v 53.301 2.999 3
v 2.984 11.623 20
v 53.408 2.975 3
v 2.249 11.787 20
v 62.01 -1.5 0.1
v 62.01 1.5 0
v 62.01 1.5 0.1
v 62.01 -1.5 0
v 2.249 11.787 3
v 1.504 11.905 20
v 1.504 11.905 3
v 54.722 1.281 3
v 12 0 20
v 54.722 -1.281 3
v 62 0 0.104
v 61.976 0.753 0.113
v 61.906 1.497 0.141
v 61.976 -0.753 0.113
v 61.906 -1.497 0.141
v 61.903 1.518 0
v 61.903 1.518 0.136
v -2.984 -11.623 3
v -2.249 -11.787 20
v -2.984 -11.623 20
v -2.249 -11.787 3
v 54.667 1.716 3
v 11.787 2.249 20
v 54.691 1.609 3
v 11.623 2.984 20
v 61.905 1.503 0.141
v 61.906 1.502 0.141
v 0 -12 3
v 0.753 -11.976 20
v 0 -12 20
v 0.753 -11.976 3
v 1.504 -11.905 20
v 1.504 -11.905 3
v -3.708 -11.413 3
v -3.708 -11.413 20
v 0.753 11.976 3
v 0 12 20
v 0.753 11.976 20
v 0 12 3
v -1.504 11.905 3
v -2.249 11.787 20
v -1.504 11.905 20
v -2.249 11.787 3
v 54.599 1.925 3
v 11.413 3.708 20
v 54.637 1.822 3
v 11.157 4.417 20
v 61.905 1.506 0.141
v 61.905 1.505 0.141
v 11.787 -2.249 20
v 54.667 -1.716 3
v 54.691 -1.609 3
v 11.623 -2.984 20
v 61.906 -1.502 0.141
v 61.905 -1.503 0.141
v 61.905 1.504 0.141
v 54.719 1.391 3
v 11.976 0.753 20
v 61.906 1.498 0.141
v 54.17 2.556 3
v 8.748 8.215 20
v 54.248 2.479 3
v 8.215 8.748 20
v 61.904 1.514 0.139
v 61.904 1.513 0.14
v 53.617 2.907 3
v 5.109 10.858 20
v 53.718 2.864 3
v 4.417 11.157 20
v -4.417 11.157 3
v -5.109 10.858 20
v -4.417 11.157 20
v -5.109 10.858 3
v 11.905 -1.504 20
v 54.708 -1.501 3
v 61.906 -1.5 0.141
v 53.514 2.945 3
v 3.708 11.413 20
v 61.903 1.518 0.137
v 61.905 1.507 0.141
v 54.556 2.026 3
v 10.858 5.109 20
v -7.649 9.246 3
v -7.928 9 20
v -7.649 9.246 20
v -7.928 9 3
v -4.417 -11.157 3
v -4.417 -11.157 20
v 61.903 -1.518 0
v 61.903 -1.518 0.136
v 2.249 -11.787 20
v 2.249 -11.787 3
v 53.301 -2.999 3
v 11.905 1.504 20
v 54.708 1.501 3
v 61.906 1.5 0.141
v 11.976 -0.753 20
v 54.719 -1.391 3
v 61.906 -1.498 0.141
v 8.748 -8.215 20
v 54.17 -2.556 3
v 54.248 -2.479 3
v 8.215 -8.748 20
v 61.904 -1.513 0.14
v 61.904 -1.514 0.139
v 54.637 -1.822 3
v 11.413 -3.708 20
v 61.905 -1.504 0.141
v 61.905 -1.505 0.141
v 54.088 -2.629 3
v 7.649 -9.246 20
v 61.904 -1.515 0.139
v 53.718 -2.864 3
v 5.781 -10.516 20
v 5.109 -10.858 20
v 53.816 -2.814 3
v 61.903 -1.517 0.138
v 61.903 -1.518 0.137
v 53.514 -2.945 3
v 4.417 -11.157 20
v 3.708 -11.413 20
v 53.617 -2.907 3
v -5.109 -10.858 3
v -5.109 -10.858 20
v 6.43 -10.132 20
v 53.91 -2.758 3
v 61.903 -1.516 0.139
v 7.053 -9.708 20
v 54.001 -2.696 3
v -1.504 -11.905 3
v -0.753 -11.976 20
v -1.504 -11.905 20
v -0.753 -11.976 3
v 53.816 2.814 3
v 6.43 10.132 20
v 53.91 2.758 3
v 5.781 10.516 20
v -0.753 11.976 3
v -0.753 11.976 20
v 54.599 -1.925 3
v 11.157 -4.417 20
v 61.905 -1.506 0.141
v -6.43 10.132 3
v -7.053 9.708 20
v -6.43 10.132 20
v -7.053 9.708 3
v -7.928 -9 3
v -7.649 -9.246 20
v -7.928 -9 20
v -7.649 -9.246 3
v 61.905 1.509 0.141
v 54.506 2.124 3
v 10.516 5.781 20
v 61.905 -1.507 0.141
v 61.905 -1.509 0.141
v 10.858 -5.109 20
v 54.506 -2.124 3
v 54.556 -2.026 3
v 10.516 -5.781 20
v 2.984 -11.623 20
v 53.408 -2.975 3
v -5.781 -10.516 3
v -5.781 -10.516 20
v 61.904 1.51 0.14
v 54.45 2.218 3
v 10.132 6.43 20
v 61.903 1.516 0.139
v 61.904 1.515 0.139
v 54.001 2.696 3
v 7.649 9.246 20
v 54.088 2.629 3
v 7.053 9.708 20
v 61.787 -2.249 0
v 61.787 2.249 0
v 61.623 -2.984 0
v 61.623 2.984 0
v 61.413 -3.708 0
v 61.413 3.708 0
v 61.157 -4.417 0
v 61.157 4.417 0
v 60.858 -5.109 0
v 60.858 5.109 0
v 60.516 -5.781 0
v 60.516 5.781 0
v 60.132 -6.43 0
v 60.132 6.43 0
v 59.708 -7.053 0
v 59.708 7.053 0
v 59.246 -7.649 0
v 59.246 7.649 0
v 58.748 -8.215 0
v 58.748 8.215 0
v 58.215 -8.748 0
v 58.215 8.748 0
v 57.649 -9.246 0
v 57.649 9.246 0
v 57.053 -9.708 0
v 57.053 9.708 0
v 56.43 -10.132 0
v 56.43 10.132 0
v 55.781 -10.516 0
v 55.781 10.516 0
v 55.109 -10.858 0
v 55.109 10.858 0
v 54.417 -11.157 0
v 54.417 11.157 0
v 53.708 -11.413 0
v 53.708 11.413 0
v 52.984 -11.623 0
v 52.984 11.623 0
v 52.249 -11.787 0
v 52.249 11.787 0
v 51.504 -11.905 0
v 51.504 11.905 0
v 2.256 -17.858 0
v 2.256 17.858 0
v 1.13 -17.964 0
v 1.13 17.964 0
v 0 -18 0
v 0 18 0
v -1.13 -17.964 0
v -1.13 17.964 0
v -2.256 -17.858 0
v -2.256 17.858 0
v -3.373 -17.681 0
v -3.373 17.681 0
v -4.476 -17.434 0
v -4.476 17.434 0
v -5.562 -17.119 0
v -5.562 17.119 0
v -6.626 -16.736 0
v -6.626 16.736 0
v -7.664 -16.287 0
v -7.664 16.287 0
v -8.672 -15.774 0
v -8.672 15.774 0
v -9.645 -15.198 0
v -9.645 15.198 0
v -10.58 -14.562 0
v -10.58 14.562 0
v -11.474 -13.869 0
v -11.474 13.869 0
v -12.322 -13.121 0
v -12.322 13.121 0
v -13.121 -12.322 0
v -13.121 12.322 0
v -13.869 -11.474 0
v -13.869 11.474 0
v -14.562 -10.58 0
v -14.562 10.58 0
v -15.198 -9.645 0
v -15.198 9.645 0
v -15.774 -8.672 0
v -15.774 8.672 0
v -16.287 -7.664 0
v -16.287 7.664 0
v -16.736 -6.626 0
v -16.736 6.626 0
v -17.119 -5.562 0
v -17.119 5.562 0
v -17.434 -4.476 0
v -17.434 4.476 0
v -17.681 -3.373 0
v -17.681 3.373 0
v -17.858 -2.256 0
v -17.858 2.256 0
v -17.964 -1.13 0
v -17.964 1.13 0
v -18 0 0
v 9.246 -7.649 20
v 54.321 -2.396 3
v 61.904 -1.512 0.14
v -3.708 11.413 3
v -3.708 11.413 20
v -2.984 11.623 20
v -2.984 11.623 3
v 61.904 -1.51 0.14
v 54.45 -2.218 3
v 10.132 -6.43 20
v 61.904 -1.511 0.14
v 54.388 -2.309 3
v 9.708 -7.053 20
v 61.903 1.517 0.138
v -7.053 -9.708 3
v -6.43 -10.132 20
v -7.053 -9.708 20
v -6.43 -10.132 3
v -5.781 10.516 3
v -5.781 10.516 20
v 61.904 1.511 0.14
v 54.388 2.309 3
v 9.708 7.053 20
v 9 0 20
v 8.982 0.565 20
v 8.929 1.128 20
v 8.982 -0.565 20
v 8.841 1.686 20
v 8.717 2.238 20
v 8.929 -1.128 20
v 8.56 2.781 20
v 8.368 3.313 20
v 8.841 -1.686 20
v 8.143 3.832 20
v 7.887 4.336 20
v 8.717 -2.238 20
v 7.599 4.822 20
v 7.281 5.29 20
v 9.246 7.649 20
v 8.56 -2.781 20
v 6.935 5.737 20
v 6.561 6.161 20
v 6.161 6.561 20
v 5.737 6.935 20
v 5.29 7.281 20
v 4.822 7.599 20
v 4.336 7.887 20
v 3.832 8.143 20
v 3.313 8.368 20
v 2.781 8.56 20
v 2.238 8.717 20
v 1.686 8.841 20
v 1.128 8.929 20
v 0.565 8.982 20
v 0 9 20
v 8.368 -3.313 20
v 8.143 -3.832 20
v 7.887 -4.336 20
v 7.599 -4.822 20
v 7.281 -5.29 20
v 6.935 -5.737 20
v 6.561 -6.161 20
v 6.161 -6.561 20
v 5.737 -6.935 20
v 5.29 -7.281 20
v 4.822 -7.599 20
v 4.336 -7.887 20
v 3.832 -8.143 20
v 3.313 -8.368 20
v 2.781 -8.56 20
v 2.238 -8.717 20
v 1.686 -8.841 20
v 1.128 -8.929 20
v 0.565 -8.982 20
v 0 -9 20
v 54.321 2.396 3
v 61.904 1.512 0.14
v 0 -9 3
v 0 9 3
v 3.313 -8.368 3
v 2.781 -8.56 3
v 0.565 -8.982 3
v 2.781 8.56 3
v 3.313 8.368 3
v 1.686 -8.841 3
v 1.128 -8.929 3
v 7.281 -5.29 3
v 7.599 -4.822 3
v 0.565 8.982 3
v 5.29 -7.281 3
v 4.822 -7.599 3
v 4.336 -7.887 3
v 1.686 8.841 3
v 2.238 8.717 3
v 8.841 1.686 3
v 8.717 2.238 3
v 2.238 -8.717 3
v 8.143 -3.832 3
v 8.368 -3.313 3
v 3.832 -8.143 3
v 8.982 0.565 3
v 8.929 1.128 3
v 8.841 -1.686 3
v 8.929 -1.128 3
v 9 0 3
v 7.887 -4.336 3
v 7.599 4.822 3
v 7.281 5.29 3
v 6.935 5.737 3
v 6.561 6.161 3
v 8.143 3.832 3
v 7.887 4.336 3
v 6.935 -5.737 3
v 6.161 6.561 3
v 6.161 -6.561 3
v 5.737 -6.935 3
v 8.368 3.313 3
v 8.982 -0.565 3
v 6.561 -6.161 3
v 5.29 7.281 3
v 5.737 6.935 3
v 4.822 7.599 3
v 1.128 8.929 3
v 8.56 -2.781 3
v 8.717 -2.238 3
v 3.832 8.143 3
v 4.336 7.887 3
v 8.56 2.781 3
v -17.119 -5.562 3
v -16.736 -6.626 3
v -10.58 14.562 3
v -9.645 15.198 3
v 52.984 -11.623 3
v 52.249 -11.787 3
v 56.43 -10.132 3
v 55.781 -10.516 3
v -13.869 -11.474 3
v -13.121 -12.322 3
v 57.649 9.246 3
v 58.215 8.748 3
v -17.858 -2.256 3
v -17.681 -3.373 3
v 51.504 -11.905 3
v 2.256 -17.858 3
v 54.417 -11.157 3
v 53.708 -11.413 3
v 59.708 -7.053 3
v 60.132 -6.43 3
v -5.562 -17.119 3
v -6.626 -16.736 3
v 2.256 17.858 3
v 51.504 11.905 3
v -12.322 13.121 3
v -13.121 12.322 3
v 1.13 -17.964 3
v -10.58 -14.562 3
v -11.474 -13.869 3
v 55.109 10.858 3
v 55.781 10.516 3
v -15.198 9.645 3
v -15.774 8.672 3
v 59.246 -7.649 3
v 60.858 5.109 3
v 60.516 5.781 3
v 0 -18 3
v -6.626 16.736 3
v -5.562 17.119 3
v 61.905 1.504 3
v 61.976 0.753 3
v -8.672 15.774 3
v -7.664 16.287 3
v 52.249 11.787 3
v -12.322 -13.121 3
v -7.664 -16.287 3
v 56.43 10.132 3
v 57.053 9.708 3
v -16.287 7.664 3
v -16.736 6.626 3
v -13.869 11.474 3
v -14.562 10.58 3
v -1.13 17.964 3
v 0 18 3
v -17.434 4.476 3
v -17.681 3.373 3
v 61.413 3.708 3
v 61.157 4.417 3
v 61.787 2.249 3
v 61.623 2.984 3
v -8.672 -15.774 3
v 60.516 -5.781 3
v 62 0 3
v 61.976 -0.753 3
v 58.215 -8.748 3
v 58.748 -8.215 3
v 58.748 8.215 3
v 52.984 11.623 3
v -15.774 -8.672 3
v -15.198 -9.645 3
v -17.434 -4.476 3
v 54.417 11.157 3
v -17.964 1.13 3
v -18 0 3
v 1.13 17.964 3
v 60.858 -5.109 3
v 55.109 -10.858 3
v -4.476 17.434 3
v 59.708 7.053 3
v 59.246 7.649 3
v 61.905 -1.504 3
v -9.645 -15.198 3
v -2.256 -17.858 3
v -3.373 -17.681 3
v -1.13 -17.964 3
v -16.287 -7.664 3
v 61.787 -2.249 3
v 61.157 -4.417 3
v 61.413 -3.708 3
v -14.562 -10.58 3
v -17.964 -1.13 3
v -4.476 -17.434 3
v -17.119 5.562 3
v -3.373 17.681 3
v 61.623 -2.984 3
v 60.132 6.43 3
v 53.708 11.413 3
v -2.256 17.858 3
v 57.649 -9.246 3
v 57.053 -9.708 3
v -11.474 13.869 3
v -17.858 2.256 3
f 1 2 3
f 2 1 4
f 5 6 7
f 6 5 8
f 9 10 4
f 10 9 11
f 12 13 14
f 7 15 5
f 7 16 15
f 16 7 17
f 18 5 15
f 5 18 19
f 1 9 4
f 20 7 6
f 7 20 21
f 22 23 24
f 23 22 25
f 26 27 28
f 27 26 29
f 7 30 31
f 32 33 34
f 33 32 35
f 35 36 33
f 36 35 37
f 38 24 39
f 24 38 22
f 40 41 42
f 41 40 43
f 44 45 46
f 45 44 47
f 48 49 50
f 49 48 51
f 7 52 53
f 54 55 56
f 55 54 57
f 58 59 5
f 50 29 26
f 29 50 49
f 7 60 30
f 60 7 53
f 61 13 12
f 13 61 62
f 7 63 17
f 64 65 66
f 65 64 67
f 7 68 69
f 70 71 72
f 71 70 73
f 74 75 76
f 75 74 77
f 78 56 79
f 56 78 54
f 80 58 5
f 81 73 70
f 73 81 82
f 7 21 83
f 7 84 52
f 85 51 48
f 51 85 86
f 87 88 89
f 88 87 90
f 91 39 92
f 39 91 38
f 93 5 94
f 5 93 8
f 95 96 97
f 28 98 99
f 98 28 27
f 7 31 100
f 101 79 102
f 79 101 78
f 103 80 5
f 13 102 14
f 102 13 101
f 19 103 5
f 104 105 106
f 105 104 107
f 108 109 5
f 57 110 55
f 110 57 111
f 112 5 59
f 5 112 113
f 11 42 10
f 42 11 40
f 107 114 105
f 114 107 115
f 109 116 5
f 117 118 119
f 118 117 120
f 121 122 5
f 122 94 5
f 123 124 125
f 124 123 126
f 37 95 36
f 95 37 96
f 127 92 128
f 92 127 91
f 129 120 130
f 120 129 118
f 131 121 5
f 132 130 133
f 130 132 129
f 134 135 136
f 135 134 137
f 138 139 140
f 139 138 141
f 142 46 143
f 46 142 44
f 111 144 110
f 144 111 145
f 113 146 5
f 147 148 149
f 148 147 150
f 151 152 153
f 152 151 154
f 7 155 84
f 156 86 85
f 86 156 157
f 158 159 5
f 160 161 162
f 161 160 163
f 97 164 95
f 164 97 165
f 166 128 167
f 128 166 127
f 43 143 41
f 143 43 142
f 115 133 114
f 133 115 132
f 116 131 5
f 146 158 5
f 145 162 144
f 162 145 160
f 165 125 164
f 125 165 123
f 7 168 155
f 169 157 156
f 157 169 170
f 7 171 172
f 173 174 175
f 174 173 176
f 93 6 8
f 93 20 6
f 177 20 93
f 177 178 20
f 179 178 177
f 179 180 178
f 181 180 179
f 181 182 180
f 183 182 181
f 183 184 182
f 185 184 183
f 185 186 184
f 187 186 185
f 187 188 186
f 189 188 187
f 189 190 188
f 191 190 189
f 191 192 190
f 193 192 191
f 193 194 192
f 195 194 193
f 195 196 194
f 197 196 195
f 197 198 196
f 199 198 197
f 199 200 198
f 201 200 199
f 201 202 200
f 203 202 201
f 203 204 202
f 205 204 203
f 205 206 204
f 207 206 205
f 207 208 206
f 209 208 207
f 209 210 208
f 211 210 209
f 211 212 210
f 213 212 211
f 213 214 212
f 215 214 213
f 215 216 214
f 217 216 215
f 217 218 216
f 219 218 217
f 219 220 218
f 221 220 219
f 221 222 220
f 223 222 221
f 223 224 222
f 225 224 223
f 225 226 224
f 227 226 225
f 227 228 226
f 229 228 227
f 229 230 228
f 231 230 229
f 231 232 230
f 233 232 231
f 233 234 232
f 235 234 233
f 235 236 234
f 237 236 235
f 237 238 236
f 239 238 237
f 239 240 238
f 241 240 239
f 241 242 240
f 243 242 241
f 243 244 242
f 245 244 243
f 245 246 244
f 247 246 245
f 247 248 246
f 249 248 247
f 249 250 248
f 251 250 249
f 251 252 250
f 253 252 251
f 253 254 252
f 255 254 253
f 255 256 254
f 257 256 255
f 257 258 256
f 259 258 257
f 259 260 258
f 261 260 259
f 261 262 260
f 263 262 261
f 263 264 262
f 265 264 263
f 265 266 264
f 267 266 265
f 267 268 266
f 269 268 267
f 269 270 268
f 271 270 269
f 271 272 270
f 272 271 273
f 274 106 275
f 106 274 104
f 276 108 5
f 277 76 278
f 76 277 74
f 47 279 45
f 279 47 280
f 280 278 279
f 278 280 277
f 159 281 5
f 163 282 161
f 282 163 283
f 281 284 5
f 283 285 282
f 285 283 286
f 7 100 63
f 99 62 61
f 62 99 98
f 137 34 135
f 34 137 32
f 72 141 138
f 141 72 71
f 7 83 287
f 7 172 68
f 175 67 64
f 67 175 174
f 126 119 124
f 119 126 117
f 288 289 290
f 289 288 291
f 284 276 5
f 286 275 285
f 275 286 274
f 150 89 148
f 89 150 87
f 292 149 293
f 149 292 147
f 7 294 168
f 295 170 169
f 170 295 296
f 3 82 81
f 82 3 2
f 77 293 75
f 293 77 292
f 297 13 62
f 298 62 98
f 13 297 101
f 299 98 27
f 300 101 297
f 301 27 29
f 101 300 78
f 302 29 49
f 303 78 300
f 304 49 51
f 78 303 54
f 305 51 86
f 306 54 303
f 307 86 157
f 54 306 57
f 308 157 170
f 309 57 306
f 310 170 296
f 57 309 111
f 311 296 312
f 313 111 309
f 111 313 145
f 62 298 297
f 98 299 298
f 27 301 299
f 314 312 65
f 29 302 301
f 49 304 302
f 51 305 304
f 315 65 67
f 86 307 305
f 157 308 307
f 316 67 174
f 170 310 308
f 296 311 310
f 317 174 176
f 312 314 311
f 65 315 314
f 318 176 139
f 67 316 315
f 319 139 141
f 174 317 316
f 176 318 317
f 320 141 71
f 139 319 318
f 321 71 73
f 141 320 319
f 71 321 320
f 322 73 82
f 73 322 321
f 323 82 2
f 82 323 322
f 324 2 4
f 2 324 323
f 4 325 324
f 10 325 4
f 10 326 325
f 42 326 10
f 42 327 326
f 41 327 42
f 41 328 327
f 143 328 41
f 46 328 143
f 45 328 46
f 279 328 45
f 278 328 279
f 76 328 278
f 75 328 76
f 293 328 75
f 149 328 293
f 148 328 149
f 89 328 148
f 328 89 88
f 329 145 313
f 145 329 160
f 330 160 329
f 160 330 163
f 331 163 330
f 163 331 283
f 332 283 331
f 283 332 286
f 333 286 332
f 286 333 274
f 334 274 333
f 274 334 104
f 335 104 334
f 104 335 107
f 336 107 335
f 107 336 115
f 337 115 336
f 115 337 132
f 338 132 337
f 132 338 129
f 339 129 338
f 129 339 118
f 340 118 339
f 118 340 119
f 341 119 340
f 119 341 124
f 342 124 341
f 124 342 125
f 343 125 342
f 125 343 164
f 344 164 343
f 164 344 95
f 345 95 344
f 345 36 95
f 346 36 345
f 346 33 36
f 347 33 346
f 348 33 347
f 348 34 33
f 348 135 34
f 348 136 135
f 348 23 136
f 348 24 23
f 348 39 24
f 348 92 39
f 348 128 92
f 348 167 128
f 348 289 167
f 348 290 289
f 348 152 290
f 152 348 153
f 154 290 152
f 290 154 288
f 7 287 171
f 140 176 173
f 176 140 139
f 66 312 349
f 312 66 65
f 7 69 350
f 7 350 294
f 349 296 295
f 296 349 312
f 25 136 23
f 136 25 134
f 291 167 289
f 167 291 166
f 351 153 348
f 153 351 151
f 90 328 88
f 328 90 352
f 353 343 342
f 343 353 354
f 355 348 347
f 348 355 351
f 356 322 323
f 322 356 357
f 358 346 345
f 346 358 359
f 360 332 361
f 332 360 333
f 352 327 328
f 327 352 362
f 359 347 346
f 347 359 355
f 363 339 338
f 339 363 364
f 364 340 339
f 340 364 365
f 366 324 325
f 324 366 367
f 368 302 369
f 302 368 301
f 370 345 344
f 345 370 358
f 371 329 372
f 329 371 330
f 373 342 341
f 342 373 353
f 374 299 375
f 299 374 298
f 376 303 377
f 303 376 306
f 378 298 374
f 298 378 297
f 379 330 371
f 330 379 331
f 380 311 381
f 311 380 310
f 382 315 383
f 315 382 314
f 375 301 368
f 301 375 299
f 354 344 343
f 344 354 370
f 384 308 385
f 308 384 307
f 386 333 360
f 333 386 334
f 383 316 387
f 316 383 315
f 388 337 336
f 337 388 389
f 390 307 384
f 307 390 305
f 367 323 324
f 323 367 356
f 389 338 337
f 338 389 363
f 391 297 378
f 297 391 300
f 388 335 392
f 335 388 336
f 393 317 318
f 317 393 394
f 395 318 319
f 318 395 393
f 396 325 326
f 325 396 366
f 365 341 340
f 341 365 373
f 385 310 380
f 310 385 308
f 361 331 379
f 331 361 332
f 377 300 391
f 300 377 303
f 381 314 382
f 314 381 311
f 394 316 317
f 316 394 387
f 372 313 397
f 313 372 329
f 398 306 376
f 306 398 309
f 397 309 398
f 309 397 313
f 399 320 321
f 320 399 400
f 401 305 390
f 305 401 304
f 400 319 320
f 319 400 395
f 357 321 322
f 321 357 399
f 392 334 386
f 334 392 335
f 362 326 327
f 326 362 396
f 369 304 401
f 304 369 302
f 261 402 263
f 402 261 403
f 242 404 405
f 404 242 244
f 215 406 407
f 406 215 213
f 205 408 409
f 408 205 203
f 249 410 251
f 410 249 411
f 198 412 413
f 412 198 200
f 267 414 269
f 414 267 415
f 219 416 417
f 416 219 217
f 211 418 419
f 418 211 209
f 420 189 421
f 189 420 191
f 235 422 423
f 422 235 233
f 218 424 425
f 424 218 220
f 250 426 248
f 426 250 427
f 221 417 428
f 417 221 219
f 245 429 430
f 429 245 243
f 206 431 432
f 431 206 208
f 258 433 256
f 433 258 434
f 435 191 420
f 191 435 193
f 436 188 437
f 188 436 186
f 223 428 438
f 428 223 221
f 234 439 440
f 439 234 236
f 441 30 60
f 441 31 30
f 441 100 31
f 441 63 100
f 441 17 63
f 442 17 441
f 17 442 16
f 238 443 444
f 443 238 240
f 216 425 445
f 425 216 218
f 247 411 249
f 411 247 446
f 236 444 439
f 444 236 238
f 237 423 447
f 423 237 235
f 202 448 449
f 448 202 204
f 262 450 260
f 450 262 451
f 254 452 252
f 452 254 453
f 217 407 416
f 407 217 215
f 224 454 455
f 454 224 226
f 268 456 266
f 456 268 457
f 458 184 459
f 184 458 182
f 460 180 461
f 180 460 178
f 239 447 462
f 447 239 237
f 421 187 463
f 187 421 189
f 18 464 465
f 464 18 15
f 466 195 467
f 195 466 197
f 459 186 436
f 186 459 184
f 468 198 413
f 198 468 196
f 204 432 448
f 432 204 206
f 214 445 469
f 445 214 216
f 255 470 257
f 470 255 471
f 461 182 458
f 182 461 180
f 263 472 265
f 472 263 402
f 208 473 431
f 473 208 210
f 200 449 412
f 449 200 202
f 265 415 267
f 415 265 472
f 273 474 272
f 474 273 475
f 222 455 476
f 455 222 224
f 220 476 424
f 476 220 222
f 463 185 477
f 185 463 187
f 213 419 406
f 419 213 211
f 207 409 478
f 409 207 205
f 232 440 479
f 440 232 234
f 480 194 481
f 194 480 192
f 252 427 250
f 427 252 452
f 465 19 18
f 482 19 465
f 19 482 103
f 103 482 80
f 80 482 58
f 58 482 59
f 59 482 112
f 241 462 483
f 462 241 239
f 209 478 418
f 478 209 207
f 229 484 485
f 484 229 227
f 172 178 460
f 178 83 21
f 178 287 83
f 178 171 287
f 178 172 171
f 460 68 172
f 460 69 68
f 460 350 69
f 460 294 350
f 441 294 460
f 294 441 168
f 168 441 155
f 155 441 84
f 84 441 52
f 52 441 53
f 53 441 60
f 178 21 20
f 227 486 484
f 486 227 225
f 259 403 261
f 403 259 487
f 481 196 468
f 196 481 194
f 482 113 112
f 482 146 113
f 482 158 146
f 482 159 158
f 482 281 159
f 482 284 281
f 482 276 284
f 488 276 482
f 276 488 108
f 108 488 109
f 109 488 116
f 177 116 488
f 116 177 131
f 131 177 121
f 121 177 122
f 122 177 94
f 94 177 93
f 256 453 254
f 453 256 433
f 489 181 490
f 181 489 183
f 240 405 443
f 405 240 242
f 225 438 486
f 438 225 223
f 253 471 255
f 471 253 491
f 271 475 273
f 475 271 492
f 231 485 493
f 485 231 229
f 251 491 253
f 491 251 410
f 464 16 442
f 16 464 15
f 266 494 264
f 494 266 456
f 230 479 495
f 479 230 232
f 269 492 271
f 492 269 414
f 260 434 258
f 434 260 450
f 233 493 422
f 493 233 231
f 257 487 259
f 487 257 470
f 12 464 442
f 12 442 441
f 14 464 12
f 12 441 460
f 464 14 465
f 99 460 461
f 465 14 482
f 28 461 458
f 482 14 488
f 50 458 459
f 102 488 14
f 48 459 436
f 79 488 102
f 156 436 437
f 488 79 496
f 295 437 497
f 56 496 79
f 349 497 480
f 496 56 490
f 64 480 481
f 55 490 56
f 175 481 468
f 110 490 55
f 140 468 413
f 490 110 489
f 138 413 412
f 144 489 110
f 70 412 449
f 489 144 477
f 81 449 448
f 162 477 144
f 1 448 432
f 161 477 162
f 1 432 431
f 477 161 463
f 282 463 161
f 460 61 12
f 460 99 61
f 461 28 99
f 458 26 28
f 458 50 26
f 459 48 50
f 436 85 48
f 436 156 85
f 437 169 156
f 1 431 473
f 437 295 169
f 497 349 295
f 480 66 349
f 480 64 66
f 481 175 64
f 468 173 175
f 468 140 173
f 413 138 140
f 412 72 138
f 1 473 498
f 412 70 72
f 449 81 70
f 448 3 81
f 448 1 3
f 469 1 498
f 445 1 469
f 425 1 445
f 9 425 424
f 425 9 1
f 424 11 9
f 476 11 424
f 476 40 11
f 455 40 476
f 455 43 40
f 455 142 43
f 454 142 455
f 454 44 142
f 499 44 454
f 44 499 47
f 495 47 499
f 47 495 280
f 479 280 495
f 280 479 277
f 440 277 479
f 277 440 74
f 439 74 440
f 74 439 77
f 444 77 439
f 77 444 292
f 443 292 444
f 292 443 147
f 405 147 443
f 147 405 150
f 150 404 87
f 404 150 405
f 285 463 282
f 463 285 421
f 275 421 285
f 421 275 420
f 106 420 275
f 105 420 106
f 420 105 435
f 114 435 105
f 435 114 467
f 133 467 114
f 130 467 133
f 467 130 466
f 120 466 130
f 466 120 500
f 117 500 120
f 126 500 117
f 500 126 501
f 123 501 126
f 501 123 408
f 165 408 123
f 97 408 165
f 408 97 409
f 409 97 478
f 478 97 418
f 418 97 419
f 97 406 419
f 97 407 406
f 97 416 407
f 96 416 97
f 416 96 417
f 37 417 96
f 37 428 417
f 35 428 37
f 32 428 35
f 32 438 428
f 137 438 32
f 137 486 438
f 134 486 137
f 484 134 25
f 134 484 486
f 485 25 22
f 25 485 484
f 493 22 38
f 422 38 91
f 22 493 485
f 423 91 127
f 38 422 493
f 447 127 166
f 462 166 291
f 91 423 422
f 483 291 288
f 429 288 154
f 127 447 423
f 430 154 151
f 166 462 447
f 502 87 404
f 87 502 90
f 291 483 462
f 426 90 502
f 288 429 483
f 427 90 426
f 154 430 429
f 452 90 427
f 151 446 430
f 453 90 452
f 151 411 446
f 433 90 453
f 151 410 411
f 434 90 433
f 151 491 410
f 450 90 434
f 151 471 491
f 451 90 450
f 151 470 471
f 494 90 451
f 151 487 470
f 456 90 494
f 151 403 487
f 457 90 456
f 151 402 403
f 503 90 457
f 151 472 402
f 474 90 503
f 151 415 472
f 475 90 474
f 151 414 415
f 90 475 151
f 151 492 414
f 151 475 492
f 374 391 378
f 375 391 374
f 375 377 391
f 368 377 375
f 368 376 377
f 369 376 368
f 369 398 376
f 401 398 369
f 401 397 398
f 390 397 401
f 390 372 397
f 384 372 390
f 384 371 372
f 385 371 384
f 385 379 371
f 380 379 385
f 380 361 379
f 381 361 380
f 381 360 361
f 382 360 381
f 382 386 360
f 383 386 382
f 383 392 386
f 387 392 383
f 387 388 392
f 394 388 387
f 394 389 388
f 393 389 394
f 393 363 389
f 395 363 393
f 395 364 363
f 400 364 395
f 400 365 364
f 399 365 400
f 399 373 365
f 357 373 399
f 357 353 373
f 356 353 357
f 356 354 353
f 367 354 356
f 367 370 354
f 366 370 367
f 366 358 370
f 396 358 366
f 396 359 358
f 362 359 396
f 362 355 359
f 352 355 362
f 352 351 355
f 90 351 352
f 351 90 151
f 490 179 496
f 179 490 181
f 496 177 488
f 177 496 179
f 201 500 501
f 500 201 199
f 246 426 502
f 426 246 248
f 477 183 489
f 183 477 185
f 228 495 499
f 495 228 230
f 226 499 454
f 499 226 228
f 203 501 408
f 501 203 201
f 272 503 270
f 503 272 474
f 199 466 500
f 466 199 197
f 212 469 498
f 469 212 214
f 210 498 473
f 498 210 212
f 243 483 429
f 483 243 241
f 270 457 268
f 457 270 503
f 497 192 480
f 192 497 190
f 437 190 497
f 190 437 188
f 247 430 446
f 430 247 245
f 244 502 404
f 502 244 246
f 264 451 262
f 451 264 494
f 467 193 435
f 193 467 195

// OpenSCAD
// 1/2" EMT Pipe Dry Box Filament Spool Holder Support Bracket
// author: fiveangle@gmail.com
// date: 2018jan06
// ver: 1.0
// notes: originally indended to build dry-box as in this video: https://www.youtube.com/watch?v=OY5n9q-wS7k
// fixes/improvements:
//     -none
// adjust to increase/decrease polygon count at expense of processing time
$fn = 100; //

rodDiameter = 18;

supportDepth = 20;

supportHeight = 50;

supportThickness = 3;


difference() {

    hull() {
        translate([0, 0, 0]) cylinder(d = rodDiameter + 2 * supportThickness, h = supportDepth);
        translate([0, 0, 0]) cylinder(d = rodDiameter, h = supportDepth);
        translate([supportHeight + 4 * supportThickness, 0 - (supportThickness / 2), 0]) cube([0.01, supportThickness, 0.1]);

    }
    hull() {
        translate([0, 0, 0]) cylinder(d = rodDiameter, h = supportDepth);
        translate([-supportHeight, 0, 0]) cylinder(d = rodDiameter, h = supportDepth);
    }


}

hull() {
    translate([0, 0, 0]) cylinder(d = rodDiameter + 3 * 2 * supportThickness, h = supportThickness);
    translate([supportHeight, 0, 0]) cylinder(d = rodDiameter + 2 * supportThickness, h = supportThickness);
}
